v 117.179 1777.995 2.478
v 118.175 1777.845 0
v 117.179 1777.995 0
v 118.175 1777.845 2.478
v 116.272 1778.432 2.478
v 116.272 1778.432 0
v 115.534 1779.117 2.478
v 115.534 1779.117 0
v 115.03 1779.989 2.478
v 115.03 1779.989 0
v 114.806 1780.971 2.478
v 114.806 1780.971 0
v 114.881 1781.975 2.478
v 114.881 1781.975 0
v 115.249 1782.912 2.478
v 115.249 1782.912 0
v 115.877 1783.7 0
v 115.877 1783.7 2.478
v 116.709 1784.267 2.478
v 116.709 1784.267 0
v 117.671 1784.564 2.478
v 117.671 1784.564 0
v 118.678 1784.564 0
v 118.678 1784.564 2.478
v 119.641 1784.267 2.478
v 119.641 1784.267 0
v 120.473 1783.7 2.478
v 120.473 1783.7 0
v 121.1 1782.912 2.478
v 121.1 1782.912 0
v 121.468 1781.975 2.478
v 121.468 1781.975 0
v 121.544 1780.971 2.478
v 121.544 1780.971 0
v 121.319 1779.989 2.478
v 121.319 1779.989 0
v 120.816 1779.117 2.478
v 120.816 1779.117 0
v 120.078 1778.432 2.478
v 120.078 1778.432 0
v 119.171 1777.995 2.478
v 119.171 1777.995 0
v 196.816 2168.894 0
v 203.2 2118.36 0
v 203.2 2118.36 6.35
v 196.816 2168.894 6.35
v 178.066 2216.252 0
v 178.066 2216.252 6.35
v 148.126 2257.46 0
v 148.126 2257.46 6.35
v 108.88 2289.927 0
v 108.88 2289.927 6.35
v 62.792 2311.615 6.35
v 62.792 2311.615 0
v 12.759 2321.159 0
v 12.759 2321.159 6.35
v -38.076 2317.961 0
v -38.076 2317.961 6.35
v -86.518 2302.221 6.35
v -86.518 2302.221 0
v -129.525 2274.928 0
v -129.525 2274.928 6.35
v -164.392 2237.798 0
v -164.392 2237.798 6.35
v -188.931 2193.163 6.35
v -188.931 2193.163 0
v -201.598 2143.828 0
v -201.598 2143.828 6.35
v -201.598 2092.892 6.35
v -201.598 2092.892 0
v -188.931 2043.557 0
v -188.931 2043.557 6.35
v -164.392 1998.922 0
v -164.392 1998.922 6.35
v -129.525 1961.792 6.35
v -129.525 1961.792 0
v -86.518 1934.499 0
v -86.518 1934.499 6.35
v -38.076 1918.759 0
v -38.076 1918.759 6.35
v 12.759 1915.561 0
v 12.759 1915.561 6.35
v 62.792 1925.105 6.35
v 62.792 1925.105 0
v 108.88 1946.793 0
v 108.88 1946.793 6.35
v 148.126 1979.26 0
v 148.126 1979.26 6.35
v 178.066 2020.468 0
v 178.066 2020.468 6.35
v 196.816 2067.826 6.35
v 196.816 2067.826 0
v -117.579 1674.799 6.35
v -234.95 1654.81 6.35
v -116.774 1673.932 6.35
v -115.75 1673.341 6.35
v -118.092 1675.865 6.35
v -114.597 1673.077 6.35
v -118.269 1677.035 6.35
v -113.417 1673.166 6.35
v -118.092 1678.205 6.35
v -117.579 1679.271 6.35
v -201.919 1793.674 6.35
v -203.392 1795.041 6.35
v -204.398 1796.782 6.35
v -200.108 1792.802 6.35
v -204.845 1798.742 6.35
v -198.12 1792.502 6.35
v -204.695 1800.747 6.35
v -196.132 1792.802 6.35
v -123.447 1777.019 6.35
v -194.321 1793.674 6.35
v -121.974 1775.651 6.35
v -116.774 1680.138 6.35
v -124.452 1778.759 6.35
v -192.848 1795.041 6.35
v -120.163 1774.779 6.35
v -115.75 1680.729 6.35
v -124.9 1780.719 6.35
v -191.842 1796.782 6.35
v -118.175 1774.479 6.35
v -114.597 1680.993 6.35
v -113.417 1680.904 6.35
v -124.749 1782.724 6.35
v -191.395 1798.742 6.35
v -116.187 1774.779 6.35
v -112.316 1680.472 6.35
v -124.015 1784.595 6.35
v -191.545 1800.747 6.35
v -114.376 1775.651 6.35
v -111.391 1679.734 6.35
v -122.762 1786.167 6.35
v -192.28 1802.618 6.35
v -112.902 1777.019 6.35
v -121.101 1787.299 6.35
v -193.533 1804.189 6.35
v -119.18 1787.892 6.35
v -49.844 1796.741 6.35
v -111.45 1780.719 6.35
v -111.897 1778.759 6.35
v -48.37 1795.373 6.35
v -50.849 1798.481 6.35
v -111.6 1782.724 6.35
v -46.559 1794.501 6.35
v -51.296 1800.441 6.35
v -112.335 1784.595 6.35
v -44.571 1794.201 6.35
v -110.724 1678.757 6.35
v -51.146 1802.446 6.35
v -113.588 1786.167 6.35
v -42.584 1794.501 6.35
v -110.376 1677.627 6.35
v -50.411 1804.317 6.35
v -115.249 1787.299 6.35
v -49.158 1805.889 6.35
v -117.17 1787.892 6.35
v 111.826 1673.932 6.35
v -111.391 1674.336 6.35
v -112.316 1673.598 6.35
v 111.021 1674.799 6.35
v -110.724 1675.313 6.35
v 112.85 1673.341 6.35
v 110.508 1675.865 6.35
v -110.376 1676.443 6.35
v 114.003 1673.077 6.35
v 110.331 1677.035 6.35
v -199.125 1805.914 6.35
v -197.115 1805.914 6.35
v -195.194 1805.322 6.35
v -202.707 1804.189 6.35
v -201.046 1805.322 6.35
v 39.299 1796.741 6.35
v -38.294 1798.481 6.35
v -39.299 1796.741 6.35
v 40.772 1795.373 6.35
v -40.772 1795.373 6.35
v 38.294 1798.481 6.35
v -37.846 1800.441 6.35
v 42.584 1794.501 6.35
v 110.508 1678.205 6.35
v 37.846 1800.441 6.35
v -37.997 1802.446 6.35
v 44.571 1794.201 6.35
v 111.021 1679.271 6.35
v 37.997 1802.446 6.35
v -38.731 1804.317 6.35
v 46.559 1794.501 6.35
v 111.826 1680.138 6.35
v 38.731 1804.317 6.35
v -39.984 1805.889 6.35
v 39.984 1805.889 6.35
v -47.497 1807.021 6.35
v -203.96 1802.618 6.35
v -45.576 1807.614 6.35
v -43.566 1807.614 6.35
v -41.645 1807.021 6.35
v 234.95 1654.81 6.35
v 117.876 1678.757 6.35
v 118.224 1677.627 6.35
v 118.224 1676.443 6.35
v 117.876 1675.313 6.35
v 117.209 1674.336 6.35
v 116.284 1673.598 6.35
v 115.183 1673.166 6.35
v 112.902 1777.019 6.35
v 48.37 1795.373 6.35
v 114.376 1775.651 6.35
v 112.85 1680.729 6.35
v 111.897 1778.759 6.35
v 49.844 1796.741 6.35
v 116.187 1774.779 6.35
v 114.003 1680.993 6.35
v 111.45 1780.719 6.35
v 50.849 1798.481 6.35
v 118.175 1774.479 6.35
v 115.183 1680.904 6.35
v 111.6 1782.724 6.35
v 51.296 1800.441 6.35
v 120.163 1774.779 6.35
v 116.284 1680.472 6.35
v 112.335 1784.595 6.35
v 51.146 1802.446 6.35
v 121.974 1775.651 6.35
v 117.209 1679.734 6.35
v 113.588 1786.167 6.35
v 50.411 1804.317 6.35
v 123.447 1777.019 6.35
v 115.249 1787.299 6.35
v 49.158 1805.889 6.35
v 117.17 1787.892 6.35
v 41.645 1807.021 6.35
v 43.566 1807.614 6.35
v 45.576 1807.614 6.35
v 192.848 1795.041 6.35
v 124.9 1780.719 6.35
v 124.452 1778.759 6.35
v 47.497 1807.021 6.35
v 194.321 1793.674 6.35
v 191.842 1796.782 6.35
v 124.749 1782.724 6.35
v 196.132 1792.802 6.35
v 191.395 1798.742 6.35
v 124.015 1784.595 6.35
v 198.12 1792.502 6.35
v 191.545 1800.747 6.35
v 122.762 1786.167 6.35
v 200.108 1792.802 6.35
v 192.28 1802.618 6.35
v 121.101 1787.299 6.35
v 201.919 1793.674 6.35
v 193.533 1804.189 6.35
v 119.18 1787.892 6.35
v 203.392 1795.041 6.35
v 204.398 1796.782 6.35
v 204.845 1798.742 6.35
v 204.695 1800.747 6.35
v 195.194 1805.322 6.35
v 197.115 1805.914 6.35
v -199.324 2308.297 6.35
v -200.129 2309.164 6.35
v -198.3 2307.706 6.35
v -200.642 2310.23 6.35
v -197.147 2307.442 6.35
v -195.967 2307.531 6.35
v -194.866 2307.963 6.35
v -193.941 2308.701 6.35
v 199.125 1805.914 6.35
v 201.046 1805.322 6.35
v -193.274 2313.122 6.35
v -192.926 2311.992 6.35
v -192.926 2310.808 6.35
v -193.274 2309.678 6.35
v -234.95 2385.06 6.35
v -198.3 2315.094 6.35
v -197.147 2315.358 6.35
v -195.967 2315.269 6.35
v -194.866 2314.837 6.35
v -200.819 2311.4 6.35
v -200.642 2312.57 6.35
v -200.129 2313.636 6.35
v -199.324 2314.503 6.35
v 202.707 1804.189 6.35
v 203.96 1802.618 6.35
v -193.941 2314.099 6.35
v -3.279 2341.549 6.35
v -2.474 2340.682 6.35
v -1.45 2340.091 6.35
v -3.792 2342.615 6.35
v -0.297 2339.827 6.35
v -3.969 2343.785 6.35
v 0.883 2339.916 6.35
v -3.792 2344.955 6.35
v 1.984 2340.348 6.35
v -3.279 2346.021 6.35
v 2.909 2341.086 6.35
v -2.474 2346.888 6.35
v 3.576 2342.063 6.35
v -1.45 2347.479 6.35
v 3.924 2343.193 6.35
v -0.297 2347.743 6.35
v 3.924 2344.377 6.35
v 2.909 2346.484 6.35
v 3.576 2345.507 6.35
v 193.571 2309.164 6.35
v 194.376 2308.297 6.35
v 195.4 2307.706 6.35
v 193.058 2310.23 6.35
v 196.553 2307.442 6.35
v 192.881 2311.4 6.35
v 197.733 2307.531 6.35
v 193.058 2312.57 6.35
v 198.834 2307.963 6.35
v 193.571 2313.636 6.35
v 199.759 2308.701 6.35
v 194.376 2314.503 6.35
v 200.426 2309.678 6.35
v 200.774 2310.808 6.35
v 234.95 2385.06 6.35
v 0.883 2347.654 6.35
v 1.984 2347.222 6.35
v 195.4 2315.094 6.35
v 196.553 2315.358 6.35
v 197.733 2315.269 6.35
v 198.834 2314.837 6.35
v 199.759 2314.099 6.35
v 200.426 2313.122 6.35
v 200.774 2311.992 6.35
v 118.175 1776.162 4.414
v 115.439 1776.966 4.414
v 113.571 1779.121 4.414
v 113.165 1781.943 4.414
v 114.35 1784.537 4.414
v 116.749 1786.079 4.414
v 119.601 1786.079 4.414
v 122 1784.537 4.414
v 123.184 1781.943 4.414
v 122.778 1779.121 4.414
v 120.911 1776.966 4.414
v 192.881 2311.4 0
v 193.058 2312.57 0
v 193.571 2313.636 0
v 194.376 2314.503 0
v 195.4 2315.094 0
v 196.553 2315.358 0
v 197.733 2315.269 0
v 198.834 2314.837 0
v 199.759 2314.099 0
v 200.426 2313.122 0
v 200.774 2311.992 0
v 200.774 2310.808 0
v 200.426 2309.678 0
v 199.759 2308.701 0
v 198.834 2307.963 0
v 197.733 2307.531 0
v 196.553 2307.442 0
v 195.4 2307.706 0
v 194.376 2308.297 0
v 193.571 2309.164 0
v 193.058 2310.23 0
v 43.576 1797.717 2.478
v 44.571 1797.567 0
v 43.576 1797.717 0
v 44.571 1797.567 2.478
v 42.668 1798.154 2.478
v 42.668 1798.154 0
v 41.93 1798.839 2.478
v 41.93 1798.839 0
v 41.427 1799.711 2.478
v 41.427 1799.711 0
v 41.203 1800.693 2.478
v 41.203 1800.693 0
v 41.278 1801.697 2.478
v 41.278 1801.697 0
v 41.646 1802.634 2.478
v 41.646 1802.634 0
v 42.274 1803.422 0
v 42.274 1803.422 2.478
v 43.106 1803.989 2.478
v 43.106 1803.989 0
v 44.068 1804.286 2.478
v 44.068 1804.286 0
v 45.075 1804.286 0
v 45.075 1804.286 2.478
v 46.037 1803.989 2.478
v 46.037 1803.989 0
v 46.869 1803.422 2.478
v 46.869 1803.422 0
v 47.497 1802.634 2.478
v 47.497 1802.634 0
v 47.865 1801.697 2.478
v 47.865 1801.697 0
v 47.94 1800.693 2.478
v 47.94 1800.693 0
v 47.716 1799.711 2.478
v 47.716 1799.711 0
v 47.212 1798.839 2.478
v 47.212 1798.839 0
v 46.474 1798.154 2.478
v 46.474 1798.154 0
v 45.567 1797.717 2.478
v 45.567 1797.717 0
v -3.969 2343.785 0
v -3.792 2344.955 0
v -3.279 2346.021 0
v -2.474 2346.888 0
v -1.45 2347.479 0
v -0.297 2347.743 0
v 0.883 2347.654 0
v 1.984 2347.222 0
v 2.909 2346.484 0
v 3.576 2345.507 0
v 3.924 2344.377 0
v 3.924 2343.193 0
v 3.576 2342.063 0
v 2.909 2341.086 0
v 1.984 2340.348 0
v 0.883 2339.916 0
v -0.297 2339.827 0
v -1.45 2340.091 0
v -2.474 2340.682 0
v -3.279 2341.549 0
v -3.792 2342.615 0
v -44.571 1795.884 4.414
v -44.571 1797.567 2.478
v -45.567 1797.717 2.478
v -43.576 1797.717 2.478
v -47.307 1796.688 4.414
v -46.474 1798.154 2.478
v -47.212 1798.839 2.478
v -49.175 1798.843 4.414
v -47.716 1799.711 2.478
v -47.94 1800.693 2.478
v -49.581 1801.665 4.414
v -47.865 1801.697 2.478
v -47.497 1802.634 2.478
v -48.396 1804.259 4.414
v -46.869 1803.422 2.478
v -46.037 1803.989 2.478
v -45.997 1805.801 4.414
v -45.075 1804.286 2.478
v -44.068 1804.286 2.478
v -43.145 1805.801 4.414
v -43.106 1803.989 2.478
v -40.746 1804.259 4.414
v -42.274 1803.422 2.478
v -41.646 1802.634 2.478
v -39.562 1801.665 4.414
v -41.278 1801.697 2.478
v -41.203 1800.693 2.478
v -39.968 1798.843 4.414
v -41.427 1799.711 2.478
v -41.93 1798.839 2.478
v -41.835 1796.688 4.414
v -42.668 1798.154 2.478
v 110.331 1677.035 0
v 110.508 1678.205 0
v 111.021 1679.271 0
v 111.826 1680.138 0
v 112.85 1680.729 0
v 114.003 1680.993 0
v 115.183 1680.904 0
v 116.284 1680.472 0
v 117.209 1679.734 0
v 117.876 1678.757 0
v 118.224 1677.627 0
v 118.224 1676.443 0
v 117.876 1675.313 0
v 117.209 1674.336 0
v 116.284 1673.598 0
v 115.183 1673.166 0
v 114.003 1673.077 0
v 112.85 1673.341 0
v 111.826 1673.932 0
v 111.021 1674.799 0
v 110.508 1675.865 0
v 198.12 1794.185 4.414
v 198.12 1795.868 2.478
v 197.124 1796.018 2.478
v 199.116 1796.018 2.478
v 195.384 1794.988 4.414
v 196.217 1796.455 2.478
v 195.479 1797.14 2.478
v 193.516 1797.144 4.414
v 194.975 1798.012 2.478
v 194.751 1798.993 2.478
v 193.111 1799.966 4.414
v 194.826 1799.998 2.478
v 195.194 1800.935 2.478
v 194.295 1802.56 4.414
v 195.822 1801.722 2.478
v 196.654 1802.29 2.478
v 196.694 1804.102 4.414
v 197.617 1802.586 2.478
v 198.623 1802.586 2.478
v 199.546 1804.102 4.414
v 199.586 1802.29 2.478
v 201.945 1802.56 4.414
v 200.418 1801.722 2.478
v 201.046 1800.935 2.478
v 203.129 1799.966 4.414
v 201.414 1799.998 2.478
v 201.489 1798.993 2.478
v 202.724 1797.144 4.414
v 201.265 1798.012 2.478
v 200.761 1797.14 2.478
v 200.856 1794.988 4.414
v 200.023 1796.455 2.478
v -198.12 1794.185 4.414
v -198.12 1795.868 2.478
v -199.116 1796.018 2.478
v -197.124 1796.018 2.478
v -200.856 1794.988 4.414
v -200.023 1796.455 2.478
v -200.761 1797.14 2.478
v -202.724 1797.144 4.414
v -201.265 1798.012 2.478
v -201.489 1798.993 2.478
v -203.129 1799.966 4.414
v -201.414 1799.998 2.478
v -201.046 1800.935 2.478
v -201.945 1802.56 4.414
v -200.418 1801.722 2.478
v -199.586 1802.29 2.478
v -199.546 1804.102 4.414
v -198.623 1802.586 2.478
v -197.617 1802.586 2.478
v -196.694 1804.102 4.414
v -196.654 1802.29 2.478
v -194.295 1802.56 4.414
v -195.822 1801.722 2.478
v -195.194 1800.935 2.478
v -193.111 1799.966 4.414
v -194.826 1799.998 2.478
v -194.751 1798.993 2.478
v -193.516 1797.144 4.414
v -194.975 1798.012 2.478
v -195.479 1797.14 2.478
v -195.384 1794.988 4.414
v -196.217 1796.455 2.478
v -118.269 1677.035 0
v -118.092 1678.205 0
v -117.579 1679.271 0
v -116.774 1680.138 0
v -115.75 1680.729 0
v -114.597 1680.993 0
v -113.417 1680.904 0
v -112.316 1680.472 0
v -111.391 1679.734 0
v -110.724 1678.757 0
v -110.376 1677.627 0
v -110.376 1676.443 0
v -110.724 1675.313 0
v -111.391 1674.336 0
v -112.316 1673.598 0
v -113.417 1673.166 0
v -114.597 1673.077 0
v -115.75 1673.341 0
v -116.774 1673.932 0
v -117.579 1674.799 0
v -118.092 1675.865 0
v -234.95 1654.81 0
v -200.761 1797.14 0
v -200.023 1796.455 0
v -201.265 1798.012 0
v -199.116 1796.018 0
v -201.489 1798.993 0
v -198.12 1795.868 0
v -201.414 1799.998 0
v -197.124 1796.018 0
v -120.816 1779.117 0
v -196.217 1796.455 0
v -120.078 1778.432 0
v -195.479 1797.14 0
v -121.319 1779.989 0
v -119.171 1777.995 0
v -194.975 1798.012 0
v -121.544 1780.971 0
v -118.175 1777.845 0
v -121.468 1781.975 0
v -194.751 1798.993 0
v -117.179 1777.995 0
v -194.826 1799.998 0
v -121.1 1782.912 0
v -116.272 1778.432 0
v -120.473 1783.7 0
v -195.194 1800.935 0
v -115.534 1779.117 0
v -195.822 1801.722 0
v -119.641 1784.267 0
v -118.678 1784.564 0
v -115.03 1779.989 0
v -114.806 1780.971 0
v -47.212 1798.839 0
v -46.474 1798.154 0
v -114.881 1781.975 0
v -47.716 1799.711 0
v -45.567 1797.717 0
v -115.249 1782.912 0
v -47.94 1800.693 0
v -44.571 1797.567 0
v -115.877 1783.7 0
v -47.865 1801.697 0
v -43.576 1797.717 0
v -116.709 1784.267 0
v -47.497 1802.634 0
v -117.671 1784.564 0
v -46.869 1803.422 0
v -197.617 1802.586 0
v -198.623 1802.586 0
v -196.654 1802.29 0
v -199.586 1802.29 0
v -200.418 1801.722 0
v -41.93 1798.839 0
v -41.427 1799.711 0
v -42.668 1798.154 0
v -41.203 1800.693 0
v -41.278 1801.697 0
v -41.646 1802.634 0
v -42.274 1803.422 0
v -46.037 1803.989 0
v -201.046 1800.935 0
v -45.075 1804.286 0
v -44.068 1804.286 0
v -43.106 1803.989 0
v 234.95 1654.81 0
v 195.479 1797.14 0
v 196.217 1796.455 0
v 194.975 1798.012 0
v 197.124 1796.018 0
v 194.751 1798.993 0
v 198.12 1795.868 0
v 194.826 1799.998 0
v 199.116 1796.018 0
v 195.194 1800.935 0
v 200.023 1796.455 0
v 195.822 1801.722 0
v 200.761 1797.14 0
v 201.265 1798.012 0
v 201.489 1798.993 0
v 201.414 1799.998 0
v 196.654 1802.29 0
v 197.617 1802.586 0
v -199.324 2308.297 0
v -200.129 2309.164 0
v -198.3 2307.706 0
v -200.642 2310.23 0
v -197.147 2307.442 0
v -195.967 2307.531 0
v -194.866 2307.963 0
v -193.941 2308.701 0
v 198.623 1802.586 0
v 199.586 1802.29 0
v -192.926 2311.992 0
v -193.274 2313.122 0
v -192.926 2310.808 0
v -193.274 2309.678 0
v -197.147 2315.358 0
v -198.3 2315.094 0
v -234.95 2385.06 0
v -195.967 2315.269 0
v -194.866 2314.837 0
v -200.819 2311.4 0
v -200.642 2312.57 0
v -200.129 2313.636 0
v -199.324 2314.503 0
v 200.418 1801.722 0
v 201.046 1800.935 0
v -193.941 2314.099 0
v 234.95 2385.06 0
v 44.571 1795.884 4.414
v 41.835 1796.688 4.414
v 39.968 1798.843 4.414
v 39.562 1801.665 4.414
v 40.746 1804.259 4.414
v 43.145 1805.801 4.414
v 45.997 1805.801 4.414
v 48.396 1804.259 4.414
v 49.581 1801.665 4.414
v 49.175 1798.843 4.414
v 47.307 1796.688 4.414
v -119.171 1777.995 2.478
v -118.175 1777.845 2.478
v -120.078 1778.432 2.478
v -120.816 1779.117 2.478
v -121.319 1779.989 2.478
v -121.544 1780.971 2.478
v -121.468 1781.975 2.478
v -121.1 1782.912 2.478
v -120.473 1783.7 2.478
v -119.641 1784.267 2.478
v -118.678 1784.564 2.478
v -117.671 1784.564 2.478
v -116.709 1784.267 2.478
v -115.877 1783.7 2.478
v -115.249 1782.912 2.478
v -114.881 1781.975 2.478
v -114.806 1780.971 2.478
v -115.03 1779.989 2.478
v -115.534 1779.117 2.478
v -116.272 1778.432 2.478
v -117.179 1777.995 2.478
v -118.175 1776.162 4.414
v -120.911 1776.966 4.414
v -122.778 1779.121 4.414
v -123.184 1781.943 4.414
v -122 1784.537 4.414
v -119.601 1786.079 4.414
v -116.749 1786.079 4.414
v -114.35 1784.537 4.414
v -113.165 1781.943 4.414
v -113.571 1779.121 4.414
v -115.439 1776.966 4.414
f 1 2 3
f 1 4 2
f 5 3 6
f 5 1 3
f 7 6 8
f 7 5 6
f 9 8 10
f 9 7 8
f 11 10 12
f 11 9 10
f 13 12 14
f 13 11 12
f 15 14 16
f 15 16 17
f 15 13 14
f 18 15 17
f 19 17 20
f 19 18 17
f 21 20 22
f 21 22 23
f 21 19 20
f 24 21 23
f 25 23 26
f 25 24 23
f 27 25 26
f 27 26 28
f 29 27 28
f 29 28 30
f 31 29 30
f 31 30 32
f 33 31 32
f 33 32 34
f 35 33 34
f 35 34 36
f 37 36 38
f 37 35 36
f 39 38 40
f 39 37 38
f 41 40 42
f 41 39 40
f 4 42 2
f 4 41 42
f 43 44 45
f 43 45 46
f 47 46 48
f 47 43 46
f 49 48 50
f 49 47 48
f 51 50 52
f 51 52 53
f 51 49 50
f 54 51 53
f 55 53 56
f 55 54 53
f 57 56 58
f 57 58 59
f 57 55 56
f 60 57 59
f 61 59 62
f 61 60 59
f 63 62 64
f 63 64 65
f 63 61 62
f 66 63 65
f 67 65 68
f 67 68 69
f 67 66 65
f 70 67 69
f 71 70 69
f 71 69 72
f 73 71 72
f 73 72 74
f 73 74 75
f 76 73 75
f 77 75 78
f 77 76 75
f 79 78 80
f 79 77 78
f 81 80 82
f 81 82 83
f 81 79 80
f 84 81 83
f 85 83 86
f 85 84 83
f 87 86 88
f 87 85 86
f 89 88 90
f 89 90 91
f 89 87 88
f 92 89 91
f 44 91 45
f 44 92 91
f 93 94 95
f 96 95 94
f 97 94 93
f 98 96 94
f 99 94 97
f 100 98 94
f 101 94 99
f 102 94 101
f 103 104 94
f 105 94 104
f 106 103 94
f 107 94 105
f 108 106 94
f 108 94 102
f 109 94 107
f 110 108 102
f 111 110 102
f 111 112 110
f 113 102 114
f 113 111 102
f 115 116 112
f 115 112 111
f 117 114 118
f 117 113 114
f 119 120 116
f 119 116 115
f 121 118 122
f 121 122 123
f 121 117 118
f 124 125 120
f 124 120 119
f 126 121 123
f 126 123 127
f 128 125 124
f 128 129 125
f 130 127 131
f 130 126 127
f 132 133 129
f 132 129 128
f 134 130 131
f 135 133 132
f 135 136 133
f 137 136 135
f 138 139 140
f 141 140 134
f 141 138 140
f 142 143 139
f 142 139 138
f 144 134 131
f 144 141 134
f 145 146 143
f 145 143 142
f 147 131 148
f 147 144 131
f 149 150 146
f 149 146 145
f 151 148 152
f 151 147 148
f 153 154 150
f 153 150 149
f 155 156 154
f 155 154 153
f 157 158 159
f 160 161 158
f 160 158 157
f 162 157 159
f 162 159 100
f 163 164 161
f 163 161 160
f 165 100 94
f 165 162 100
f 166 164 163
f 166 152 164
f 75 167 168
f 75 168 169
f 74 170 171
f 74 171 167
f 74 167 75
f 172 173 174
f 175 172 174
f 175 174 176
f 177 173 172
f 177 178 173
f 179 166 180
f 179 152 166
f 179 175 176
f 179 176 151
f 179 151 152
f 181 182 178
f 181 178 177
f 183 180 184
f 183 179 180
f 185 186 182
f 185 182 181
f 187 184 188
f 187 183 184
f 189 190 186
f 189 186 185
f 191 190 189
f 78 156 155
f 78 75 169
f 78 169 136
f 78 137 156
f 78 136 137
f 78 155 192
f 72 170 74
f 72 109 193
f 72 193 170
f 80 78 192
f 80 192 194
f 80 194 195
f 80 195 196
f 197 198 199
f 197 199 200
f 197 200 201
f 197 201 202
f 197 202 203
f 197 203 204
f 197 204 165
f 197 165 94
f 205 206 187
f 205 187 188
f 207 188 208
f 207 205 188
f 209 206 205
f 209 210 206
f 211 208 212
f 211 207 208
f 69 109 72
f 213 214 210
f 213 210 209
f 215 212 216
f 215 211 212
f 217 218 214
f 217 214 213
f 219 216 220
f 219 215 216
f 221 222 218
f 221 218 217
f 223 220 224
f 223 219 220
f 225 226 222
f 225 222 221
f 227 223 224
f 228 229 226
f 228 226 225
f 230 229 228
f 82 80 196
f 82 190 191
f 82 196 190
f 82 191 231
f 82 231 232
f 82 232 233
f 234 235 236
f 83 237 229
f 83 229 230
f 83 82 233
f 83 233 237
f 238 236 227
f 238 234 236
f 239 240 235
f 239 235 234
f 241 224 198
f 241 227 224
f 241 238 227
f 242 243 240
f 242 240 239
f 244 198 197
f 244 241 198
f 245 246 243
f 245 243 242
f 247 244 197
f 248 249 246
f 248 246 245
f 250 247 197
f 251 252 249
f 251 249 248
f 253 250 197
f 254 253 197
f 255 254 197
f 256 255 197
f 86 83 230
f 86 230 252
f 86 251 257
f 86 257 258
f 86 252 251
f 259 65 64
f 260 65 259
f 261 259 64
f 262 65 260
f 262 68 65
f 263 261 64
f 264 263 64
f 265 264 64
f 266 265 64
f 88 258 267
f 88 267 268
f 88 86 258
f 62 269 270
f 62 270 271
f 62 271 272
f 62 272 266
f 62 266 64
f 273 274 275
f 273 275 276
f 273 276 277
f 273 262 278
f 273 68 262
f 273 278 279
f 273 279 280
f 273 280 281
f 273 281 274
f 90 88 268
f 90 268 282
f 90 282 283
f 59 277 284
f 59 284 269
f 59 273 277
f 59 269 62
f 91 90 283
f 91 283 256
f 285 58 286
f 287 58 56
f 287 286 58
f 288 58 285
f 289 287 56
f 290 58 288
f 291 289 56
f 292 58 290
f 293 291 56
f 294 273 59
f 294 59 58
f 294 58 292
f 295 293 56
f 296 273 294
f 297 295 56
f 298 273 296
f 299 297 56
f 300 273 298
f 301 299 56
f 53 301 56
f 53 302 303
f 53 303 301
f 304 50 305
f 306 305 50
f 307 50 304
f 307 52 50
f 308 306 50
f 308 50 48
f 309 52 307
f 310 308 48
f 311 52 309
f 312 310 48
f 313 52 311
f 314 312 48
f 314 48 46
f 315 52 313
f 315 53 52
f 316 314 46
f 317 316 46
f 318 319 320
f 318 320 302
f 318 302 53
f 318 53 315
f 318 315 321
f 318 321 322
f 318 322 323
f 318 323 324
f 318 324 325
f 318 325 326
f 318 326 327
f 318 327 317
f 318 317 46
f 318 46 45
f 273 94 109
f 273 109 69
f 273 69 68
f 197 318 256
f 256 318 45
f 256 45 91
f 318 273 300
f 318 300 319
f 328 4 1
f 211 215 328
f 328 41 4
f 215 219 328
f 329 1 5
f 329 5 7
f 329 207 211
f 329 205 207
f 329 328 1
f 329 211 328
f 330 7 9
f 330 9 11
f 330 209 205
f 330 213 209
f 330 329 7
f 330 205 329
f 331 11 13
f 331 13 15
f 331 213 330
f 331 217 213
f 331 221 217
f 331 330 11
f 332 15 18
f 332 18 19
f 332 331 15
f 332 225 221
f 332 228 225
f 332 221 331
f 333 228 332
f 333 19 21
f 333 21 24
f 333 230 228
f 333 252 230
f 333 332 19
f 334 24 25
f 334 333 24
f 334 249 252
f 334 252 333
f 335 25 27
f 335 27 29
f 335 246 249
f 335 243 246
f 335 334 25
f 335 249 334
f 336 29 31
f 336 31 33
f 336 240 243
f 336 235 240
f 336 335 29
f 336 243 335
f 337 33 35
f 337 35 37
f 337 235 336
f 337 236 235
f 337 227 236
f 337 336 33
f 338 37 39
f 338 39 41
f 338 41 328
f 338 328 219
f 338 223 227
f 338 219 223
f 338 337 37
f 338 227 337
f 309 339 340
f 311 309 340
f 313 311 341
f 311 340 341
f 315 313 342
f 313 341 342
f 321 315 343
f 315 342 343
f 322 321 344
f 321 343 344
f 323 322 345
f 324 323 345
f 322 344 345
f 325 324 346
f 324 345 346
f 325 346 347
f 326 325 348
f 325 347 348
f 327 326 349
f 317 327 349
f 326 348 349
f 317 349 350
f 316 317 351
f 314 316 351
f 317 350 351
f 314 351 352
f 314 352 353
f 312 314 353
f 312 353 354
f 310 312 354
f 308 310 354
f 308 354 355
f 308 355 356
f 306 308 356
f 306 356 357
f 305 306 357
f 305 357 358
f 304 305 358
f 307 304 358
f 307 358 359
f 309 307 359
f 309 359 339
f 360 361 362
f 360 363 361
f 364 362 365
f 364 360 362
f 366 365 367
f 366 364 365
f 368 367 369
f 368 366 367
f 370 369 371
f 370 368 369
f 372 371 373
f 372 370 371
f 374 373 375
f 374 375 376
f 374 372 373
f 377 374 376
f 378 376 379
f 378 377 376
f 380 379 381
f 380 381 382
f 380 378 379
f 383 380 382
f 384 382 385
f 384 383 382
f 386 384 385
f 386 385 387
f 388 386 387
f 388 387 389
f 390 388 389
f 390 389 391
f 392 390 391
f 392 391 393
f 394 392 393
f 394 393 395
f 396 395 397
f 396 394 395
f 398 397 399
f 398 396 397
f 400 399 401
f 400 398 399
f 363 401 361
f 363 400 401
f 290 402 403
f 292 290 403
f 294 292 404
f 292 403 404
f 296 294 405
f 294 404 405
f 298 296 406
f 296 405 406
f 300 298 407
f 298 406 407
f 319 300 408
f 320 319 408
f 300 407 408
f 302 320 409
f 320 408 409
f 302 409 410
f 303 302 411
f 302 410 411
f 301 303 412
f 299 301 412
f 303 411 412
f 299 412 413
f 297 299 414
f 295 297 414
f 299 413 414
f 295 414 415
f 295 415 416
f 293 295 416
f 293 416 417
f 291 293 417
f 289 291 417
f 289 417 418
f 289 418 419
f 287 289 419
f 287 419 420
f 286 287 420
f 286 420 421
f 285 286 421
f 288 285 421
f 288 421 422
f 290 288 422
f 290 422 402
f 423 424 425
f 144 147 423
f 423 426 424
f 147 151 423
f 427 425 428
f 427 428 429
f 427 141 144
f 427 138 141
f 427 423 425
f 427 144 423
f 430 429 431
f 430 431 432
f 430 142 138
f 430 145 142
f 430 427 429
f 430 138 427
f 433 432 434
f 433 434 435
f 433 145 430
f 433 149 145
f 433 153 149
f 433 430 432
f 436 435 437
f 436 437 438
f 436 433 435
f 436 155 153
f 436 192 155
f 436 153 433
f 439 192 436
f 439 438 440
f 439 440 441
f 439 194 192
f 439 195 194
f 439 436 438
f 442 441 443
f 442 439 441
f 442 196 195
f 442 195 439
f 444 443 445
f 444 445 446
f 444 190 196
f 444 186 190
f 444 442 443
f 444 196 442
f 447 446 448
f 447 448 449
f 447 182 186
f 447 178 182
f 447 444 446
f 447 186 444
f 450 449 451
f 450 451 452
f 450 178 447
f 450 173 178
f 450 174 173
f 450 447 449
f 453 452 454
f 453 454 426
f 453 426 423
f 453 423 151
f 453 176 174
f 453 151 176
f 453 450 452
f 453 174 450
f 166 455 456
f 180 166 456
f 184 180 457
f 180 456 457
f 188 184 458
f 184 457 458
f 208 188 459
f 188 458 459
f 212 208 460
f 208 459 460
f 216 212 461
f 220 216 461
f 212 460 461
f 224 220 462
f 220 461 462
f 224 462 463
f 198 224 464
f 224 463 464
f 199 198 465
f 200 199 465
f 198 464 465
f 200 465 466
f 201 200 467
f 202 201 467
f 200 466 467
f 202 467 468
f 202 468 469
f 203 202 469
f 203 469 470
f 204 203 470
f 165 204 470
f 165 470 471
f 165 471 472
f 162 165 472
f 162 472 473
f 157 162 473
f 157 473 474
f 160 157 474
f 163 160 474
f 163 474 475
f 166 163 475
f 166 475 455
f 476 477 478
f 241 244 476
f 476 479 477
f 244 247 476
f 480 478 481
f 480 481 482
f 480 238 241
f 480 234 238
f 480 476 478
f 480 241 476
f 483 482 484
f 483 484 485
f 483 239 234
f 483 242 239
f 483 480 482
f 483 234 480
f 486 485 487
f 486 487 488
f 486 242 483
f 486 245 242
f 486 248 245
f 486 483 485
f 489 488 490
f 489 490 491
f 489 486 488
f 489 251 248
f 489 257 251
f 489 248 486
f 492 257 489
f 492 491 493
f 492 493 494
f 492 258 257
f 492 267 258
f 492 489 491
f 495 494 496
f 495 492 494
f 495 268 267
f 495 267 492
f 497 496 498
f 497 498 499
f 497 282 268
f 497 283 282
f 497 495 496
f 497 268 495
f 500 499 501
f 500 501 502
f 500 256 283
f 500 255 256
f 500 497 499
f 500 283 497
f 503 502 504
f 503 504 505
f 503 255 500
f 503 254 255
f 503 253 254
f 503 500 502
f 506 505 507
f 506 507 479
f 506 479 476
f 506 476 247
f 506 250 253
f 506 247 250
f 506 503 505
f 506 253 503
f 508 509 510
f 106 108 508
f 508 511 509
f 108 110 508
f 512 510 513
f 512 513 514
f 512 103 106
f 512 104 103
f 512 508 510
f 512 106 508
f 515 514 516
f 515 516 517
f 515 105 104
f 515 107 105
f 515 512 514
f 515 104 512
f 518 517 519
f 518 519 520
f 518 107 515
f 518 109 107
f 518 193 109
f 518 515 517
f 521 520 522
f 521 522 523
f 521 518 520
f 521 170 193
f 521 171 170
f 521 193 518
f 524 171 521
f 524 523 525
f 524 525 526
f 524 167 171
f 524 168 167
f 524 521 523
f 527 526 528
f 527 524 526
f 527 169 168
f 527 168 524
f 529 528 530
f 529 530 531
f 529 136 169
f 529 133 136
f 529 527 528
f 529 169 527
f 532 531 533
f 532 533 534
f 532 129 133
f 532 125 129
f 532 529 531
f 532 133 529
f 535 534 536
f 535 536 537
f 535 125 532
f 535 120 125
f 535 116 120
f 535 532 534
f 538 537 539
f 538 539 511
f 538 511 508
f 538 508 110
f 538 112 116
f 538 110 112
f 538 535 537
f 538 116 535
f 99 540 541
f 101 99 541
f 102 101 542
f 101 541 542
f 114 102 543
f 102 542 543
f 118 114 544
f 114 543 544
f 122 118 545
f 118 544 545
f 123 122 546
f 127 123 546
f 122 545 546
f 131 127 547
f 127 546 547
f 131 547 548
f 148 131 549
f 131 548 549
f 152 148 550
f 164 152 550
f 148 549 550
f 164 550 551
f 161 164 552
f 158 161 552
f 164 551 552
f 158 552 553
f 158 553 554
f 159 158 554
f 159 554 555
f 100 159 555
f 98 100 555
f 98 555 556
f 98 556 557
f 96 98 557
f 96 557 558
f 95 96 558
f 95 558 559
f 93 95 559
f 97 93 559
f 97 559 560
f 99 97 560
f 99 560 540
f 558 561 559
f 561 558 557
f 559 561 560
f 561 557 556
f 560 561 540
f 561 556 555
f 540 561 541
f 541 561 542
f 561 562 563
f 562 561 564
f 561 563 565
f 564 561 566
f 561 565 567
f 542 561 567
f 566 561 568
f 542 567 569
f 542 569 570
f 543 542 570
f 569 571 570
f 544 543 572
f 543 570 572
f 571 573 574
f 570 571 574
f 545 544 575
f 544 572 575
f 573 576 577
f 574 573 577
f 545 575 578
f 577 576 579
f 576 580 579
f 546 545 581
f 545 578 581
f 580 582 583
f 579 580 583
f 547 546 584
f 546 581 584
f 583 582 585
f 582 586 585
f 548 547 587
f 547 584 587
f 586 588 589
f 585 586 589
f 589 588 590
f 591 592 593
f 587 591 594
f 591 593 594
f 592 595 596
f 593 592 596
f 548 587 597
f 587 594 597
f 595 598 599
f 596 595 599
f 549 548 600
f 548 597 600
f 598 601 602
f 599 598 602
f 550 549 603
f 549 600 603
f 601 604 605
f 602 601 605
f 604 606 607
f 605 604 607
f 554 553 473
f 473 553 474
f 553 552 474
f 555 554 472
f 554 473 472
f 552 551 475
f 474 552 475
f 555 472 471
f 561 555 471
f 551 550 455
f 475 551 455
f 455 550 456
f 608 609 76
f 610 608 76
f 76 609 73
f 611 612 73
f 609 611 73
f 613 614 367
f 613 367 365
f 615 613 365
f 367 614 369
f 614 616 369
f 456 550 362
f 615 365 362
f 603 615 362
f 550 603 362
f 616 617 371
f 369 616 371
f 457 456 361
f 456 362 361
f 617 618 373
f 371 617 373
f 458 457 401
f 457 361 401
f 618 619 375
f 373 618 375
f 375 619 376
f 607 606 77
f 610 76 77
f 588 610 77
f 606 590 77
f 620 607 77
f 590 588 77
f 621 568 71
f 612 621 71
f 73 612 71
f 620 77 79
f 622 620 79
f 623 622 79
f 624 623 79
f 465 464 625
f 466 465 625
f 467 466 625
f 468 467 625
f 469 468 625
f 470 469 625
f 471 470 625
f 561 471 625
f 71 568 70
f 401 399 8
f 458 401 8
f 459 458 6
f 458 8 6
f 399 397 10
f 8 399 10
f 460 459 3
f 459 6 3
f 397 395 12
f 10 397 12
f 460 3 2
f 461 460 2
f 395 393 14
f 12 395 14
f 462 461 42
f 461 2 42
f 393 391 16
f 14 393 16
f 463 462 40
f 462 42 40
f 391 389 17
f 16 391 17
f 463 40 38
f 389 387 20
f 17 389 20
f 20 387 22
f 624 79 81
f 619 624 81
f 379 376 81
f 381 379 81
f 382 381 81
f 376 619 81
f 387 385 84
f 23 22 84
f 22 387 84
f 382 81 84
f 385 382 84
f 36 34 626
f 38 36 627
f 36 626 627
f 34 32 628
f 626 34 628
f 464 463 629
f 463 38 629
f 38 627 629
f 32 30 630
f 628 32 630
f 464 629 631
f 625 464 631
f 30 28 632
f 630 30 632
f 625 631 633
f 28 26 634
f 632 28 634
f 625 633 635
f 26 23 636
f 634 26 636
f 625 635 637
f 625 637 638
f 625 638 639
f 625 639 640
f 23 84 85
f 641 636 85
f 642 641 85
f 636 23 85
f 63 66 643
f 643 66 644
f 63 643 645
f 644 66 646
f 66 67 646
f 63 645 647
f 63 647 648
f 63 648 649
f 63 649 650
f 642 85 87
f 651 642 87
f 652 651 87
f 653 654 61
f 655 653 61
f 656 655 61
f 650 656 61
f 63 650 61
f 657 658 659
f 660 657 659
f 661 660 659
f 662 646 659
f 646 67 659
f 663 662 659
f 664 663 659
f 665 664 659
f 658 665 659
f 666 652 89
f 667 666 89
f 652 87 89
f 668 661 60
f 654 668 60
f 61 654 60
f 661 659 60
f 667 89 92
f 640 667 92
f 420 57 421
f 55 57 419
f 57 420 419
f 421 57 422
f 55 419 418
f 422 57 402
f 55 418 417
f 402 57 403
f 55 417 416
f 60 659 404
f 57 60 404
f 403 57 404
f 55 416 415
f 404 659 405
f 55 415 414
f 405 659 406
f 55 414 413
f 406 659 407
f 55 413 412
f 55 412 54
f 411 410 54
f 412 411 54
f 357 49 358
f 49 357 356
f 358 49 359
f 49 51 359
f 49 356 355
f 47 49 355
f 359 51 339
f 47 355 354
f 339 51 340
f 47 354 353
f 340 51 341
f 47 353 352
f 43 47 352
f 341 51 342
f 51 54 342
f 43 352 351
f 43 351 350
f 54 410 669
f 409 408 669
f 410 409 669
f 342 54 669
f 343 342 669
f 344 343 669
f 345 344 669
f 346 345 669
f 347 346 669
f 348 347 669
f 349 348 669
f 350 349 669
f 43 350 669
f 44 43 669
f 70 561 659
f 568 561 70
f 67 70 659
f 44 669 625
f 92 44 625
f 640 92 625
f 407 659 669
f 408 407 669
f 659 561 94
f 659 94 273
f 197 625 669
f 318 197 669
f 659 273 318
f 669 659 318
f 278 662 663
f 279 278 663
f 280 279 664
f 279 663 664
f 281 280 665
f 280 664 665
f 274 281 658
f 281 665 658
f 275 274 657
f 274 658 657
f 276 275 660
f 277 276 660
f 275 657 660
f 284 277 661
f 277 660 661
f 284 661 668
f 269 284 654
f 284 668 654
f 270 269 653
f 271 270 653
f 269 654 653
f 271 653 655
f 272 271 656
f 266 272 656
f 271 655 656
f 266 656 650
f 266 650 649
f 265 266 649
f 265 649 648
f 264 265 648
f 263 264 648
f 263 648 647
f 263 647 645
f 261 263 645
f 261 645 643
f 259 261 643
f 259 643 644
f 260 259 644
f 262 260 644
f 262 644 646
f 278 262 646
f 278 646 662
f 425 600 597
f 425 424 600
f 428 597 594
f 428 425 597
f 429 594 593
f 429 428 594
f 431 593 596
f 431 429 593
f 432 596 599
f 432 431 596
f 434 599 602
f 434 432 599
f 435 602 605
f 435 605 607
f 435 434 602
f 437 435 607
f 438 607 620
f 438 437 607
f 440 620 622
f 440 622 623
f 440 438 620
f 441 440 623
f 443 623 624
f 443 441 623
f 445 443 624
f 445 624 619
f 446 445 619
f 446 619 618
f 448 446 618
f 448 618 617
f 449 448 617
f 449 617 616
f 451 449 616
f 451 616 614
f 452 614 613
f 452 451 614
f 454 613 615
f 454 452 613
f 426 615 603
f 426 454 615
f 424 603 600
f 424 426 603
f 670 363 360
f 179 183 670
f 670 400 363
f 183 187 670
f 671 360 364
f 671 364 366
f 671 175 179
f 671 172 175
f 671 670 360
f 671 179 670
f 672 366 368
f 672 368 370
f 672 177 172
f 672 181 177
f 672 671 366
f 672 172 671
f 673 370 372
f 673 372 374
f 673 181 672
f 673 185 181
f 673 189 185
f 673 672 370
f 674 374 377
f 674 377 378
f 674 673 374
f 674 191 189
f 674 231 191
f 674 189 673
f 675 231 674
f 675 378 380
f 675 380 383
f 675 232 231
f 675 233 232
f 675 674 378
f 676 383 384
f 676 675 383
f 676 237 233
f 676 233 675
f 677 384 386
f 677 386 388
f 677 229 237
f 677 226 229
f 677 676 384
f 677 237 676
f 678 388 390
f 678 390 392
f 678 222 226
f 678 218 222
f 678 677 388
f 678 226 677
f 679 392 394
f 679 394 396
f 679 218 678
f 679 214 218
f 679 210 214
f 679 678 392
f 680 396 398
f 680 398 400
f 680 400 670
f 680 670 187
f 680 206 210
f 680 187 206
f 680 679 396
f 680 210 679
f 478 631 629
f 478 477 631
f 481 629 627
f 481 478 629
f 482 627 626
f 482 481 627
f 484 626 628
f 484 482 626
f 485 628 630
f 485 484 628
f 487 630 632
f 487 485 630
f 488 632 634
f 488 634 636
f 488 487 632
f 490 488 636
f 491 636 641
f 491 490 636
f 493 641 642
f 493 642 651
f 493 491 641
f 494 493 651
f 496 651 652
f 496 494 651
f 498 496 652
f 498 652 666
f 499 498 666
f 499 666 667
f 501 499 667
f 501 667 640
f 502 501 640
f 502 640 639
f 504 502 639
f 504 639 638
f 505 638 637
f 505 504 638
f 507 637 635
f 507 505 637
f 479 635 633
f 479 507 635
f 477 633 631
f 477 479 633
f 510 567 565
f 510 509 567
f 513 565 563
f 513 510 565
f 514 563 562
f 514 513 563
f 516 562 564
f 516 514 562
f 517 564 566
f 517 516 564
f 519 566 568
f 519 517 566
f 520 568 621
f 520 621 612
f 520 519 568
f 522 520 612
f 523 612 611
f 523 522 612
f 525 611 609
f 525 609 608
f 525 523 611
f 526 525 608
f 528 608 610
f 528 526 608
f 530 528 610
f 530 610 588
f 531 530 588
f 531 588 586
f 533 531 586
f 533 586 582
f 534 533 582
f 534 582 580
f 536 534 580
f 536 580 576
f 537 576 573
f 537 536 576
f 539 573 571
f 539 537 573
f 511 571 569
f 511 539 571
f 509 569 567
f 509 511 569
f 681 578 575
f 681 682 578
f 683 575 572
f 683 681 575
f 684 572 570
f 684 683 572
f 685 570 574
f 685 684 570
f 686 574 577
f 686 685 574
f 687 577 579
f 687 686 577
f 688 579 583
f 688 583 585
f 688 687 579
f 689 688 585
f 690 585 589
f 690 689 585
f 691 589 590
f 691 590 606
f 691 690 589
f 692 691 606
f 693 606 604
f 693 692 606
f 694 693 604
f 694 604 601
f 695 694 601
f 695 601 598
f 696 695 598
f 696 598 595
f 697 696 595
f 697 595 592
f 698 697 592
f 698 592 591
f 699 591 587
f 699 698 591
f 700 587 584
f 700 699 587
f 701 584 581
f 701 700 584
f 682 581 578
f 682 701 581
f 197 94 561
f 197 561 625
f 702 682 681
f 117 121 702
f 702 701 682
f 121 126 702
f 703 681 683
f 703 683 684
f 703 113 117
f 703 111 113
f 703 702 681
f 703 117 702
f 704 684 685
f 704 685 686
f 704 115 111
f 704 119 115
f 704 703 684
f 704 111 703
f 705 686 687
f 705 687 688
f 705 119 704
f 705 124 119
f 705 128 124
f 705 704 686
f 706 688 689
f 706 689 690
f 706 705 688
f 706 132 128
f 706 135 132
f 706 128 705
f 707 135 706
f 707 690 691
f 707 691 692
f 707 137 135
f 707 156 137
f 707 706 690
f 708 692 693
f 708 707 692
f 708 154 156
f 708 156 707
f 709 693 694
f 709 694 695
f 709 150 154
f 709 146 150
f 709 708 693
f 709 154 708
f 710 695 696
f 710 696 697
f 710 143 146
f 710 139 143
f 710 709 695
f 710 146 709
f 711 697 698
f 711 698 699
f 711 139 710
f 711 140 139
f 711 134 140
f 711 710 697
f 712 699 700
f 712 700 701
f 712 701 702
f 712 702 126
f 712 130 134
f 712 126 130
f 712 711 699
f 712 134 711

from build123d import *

# Parameters (mm, degrees)
SKETCH1_W                                     = 469.9
SKETCH1_H                                     = 2413
SKETCH1_R                                     = 203.2
BOSS_EXTRUDE1_DEPTH                           = 6.35
CSK_FOR_1_4_FLAT_HEAD_SOCKET_CAP_SCR_2_COUNT  = 2
CSK_FOR_1_4_FLAT_HEAD_SOCKET_CAP_SCR_2_PITCH  = 76.2
CSK_FOR_1_4_FLAT_HEAD_SOCKET_CAP_SCR_3_COUNT  = 2
CSK_FOR_1_4_FLAT_HEAD_SOCKET_CAP_SCR_3_PITCH  = 89.142542345
CSK_FOR_1_4_FLAT_HEAD_SOCKET_CAP_SCR_4_COUNT  = 2
CSK_FOR_1_4_FLAT_HEAD_SOCKET_CAP_SCR_4_PITCH  = 163.936718394
CSK_FOR_1_4_FLAT_HEAD_SOCKET_CAP_SCR_5_COUNT  = 2
CSK_FOR_1_4_FLAT_HEAD_SOCKET_CAP_SCR_5_PITCH  = 711.2
CSK_FOR_1_4_FLAT_HEAD_SOCKET_CAP_SCR_6_COUNT  = 2
CSK_FOR_1_4_FLAT_HEAD_SOCKET_CAP_SCR_6_PITCH  = 695.384275934
CSK_FOR_1_4_FLAT_HEAD_SOCKET_CAP_SCR_7_COUNT  = 2
CSK_FOR_1_4_FLAT_HEAD_SOCKET_CAP_SCR_7_PITCH  = 716.764837904
CSK_FOR_1_4_FLAT_HEAD_SOCKET_CAP_SCR_8_COUNT  = 2
CSK_FOR_1_4_FLAT_HEAD_SOCKET_CAP_SCR_8_PITCH  = 710.371803251
CSK_FOR_1_4_FLAT_HEAD_SOCKET_CAP_SCR_9_COUNT  = 2
CSK_FOR_1_4_FLAT_HEAD_SOCKET_CAP_SCR_9_PITCH  = 1422.4
CSK_FOR_1_4_FLAT_HEAD_SOCKET_CAP_SCR_10_COUNT = 2
CSK_FOR_1_4_FLAT_HEAD_SOCKET_CAP_SCR_10_PITCH = 1404.60778242
CSK_FOR_1_4_FLAT_HEAD_SOCKET_CAP_SCR_11_COUNT = 2
CSK_FOR_1_4_FLAT_HEAD_SOCKET_CAP_SCR_11_PITCH = 1425.190567207
CSK_FOR_1_4_FLAT_HEAD_SOCKET_CAP_SCR_12_COUNT = 2
CSK_FOR_1_4_FLAT_HEAD_SOCKET_CAP_SCR_12_PITCH = 1412.087755797
CSK_FOR_1_4_FLAT_HEAD_SOCKET_CAP_SCR_13_COUNT = 2
CSK_FOR_1_4_FLAT_HEAD_SOCKET_CAP_SCR_13_PITCH = 153.55813077
CSK_FOR_1_4_FLAT_HEAD_SOCKET_CAP_SCR_14_COUNT = 2
CSK_FOR_1_4_FLAT_HEAD_SOCKET_CAP_SCR_14_PITCH = 242.697219812
CSK_FOR_1_4_FLAT_HEAD_SOCKET_CAP_SCR_15_COUNT = 2
CSK_FOR_1_4_FLAT_HEAD_SOCKET_CAP_SCR_15_PITCH = 749.86024568
CSK_FOR_1_4_FLAT_HEAD_SOCKET_CAP_SCR_16_COUNT = 2
CSK_FOR_1_4_FLAT_HEAD_SOCKET_CAP_SCR_16_PITCH = 1441.280581843
CSK_FOR_1_4_FLAT_HEAD_SOCKET_CAP_SCR_17_COUNT = 2
CSK_FOR_1_4_FLAT_HEAD_SOCKET_CAP_SCR_17_PITCH = 1428.974413563
CSK_FOR_1_4_FLAT_HEAD_SOCKET_CAP_SCR_18_COUNT = 2
CSK_FOR_1_4_FLAT_HEAD_SOCKET_CAP_SCR_18_PITCH = 725.925992834
F_5_16_0_3125_DIAMETER_HOLE1_D                = 7.9375
SKETCH6_W                                     = 469.9
SKETCH6_H                                     = 1654.81
CUT_EXTRUDE1_DEPTH                            = 7.35
SKETCH7_W                                     = 469.9
SKETCH7_H                                     = 27.94
CUT_EXTRUDE2_DEPTH                            = 7.35


with BuildPart() as part:
    # Sketch1 → Boss-Extrude1 (new body)
    with BuildSketch(Plane.XY):
        with Locations((0, 1206.5)):
            Rectangle(SKETCH1_W, SKETCH1_H)
        with Locations((0, 695.96)):
            Circle(SKETCH1_R, mode=Mode.SUBTRACT)
        with Locations((0, 1407.16)):
            Circle(SKETCH1_R, mode=Mode.SUBTRACT)
        with Locations((0, 2118.36)):
            Circle(SKETCH1_R, mode=Mode.SUBTRACT)
    extrude(amount=BOSS_EXTRUDE1_DEPTH)

    # Sketch3 → CSK for 1/4 Flat Head Socket Cap Screw1 (revolve, cut)
    with BuildSketch(Plane(origin=(44.571271172, 378.545152647, 6.35), x_dir=(0, -1, 0), z_dir=(1, 0, 0))):
        Polygon((0, 0), (0, 6.35), (3.3782, 6.35), (3.3782, 3.871564875), (6.7437, 0), align=None)
    csk_for_1_4_flat_head_socket_cap_screw1 = revolve(axis=Axis((44.571271172, 378.545152647, 12.7), (0, 0, -1)), mode=Mode.SUBTRACT)

    # CSK for 1_4 Flat Head Socket Cap Scr 2: CSK for 1/4 Flat Head Socket Cap Screw1 ×2
    with Locations(*[Vector(0.965925826, -0.258819045, 0) * (i * CSK_FOR_1_4_FLAT_HEAD_SOCKET_CAP_SCR_2_PITCH) for i in range(1, CSK_FOR_1_4_FLAT_HEAD_SOCKET_CAP_SCR_2_COUNT)]):
        add(csk_for_1_4_flat_head_socket_cap_screw1, mode=Mode.SUBTRACT)

    # CSK for 1_4 Flat Head Socket Cap Scr 3: CSK for 1/4 Flat Head Socket Cap Screw1 ×2
    with Locations(*[(-i * CSK_FOR_1_4_FLAT_HEAD_SOCKET_CAP_SCR_3_PITCH, 0, 0) for i in range(1, CSK_FOR_1_4_FLAT_HEAD_SOCKET_CAP_SCR_3_COUNT)]):
        add(csk_for_1_4_flat_head_socket_cap_screw1, mode=Mode.SUBTRACT)

    # CSK for 1_4 Flat Head Socket Cap Scr 4: CSK for 1/4 Flat Head Socket Cap Screw1 ×2
    with Locations(*[Vector(-0.99273727, -0.120302586, 0) * (i * CSK_FOR_1_4_FLAT_HEAD_SOCKET_CAP_SCR_4_PITCH) for i in range(1, CSK_FOR_1_4_FLAT_HEAD_SOCKET_CAP_SCR_4_COUNT)]):
        add(csk_for_1_4_flat_head_socket_cap_screw1, mode=Mode.SUBTRACT)

    # CSK for 1_4 Flat Head Socket Cap Scr 5: CSK for 1/4 Flat Head Socket Cap Screw1 ×2
    with Locations(*[(0, i * CSK_FOR_1_4_FLAT_HEAD_SOCKET_CAP_SCR_5_PITCH, 0) for i in range(1, CSK_FOR_1_4_FLAT_HEAD_SOCKET_CAP_SCR_5_COUNT)]):
        add(csk_for_1_4_flat_head_socket_cap_screw1, mode=Mode.SUBTRACT)

    # CSK for 1_4 Flat Head Socket Cap Scr 6: CSK for 1/4 Flat Head Socket Cap Screw1 ×2
    with Locations(*[Vector(0.105845862, 0.994382549, 0) * (i * CSK_FOR_1_4_FLAT_HEAD_SOCKET_CAP_SCR_6_PITCH) for i in range(1, CSK_FOR_1_4_FLAT_HEAD_SOCKET_CAP_SCR_6_COUNT)]):
        add(csk_for_1_4_flat_head_socket_cap_screw1, mode=Mode.SUBTRACT)

    # CSK for 1_4 Flat Head Socket Cap Scr 7: CSK for 1/4 Flat Head Socket Cap Screw1 ×2
    with Locations(*[Vector(-0.124367907, 0.992236173, 0) * (i * CSK_FOR_1_4_FLAT_HEAD_SOCKET_CAP_SCR_7_PITCH) for i in range(1, CSK_FOR_1_4_FLAT_HEAD_SOCKET_CAP_SCR_7_COUNT)]):
        add(csk_for_1_4_flat_head_socket_cap_screw1, mode=Mode.SUBTRACT)

    # CSK for 1_4 Flat Head Socket Cap Scr 8: CSK for 1/4 Flat Head Socket Cap Screw1 ×2
    with Locations(*[Vector(-0.229099874, 0.973402922, 0) * (i * CSK_FOR_1_4_FLAT_HEAD_SOCKET_CAP_SCR_8_PITCH) for i in range(1, CSK_FOR_1_4_FLAT_HEAD_SOCKET_CAP_SCR_8_COUNT)]):
        add(csk_for_1_4_flat_head_socket_cap_screw1, mode=Mode.SUBTRACT)

    # CSK for 1_4 Flat Head Socket Cap Scr 9: CSK for 1/4 Flat Head Socket Cap Screw1 ×2
    with Locations(*[(0, i * CSK_FOR_1_4_FLAT_HEAD_SOCKET_CAP_SCR_9_PITCH, 0) for i in range(1, CSK_FOR_1_4_FLAT_HEAD_SOCKET_CAP_SCR_9_COUNT)]):
        add(csk_for_1_4_flat_head_socket_cap_screw1, mode=Mode.SUBTRACT)

    # CSK for 1_4 Flat Head Socket Cap Scr 10: CSK for 1/4 Flat Head Socket Cap Screw1 ×2
    with Locations(*[Vector(0.052401495, 0.998626098, 0) * (i * CSK_FOR_1_4_FLAT_HEAD_SOCKET_CAP_SCR_10_PITCH) for i in range(1, CSK_FOR_1_4_FLAT_HEAD_SOCKET_CAP_SCR_10_COUNT)]):
        add(csk_for_1_4_flat_head_socket_cap_screw1, mode=Mode.SUBTRACT)

    # CSK for 1_4 Flat Head Socket Cap Scr 11: CSK for 1/4 Flat Head Socket Cap Screw1 ×2
    with Locations(*[Vector(-0.062547805, 0.998041969, 0) * (i * CSK_FOR_1_4_FLAT_HEAD_SOCKET_CAP_SCR_11_PITCH) for i in range(1, CSK_FOR_1_4_FLAT_HEAD_SOCKET_CAP_SCR_11_COUNT)]):
        add(csk_for_1_4_flat_head_socket_cap_screw1, mode=Mode.SUBTRACT)

    # CSK for 1_4 Flat Head Socket Cap Scr 12: CSK for 1/4 Flat Head Socket Cap Screw1 ×2
    with Locations(*[Vector(-0.115252108, 0.993336273, 0) * (i * CSK_FOR_1_4_FLAT_HEAD_SOCKET_CAP_SCR_12_PITCH) for i in range(1, CSK_FOR_1_4_FLAT_HEAD_SOCKET_CAP_SCR_12_COUNT)]):
        add(csk_for_1_4_flat_head_socket_cap_screw1, mode=Mode.SUBTRACT)

    # CSK for 1_4 Flat Head Socket Cap Scr 13: CSK for 1/4 Flat Head Socket Cap Screw1 ×2
    with Locations(*[Vector(0.999938773, -0.011065747, 0) * (i * CSK_FOR_1_4_FLAT_HEAD_SOCKET_CAP_SCR_13_PITCH) for i in range(1, CSK_FOR_1_4_FLAT_HEAD_SOCKET_CAP_SCR_13_COUNT)]):
        add(csk_for_1_4_flat_head_socket_cap_screw1, mode=Mode.SUBTRACT)

    # CSK for 1_4 Flat Head Socket Cap Scr 14: CSK for 1/4 Flat Head Socket Cap Screw1 ×2
    with Locations(*[Vector(-0.999975489, -0.007001462, 0) * (i * CSK_FOR_1_4_FLAT_HEAD_SOCKET_CAP_SCR_14_PITCH) for i in range(1, CSK_FOR_1_4_FLAT_HEAD_SOCKET_CAP_SCR_14_COUNT)]):
        add(csk_for_1_4_flat_head_socket_cap_screw1, mode=Mode.SUBTRACT)

    # CSK for 1_4 Flat Head Socket Cap Scr 15: CSK for 1/4 Flat Head Socket Cap Screw1 ×2
    with Locations(*[Vector(-0.32364867, 0.946177329, 0) * (i * CSK_FOR_1_4_FLAT_HEAD_SOCKET_CAP_SCR_15_PITCH) for i in range(1, CSK_FOR_1_4_FLAT_HEAD_SOCKET_CAP_SCR_15_COUNT)]):
        add(csk_for_1_4_flat_head_socket_cap_screw1, mode=Mode.SUBTRACT)

    # CSK for 1_4 Flat Head Socket Cap Scr 16: CSK for 1/4 Flat Head Socket Cap Screw1 ×2
    with Locations(*[Vector(-0.168385861, 0.985721158, 0) * (i * CSK_FOR_1_4_FLAT_HEAD_SOCKET_CAP_SCR_16_PITCH) for i in range(1, CSK_FOR_1_4_FLAT_HEAD_SOCKET_CAP_SCR_16_COUNT)]):
        add(csk_for_1_4_flat_head_socket_cap_screw1, mode=Mode.SUBTRACT)

    # CSK for 1_4 Flat Head Socket Cap Scr 17: CSK for 1/4 Flat Head Socket Cap Screw1 ×2
    with Locations(*[Vector(0.107453799, 0.994210079, 0) * (i * CSK_FOR_1_4_FLAT_HEAD_SOCKET_CAP_SCR_17_PITCH) for i in range(1, CSK_FOR_1_4_FLAT_HEAD_SOCKET_CAP_SCR_17_COUNT)]):
        add(csk_for_1_4_flat_head_socket_cap_screw1, mode=Mode.SUBTRACT)

    # CSK for 1_4 Flat Head Socket Cap Scr 18: CSK for 1/4 Flat Head Socket Cap Screw1 ×2
    with Locations(*[Vector(0.211521189, 0.977373412, 0) * (i * CSK_FOR_1_4_FLAT_HEAD_SOCKET_CAP_SCR_18_PITCH) for i in range(1, CSK_FOR_1_4_FLAT_HEAD_SOCKET_CAP_SCR_18_COUNT)]):
        add(csk_for_1_4_flat_head_socket_cap_screw1, mode=Mode.SUBTRACT)

    # 5/16 (0.3125) Diameter Hole1 (through all)
    with Locations(Plane.XY.offset(6.35)):
        with Locations((-114.3, 254.635), (-114.3, 210.185), (-196.85, 177.8), (196.85, 177.8), (114.3, 210.185), (114.3, 254.635), (-114.3, 965.835), (-114.3, 921.385), (-196.85, 889), (196.85, 889), (114.3, 921.385), (114.3, 965.835), (-114.3, 1677.035), (-114.3, 1632.585), (-196.85, 1600.2), (196.85, 1600.2), (114.3, 1632.585), (114.3, 1677.035), (-196.85, 2311.4), (196.85, 2311.4), (0, 2343.785)):
            Hole(F_5_16_0_3125_DIAMETER_HOLE1_D / 2)

    # Sketch6 → Cut-Extrude1 (cut, through all)
    with BuildSketch(Plane.XY.offset(6.35)):
        with Locations((0, 827.405)):
            Rectangle(SKETCH6_W, SKETCH6_H)
    extrude(amount=-CUT_EXTRUDE1_DEPTH, mode=Mode.SUBTRACT)

    # Sketch7 → Cut-Extrude2 (cut, through all)
    with BuildSketch(Plane.XY.offset(6.35)):
        with Locations((0, 2399.03)):
            Rectangle(SKETCH7_W, SKETCH7_H)
    extrude(amount=-CUT_EXTRUDE2_DEPTH, mode=Mode.SUBTRACT)


solid = part.part
